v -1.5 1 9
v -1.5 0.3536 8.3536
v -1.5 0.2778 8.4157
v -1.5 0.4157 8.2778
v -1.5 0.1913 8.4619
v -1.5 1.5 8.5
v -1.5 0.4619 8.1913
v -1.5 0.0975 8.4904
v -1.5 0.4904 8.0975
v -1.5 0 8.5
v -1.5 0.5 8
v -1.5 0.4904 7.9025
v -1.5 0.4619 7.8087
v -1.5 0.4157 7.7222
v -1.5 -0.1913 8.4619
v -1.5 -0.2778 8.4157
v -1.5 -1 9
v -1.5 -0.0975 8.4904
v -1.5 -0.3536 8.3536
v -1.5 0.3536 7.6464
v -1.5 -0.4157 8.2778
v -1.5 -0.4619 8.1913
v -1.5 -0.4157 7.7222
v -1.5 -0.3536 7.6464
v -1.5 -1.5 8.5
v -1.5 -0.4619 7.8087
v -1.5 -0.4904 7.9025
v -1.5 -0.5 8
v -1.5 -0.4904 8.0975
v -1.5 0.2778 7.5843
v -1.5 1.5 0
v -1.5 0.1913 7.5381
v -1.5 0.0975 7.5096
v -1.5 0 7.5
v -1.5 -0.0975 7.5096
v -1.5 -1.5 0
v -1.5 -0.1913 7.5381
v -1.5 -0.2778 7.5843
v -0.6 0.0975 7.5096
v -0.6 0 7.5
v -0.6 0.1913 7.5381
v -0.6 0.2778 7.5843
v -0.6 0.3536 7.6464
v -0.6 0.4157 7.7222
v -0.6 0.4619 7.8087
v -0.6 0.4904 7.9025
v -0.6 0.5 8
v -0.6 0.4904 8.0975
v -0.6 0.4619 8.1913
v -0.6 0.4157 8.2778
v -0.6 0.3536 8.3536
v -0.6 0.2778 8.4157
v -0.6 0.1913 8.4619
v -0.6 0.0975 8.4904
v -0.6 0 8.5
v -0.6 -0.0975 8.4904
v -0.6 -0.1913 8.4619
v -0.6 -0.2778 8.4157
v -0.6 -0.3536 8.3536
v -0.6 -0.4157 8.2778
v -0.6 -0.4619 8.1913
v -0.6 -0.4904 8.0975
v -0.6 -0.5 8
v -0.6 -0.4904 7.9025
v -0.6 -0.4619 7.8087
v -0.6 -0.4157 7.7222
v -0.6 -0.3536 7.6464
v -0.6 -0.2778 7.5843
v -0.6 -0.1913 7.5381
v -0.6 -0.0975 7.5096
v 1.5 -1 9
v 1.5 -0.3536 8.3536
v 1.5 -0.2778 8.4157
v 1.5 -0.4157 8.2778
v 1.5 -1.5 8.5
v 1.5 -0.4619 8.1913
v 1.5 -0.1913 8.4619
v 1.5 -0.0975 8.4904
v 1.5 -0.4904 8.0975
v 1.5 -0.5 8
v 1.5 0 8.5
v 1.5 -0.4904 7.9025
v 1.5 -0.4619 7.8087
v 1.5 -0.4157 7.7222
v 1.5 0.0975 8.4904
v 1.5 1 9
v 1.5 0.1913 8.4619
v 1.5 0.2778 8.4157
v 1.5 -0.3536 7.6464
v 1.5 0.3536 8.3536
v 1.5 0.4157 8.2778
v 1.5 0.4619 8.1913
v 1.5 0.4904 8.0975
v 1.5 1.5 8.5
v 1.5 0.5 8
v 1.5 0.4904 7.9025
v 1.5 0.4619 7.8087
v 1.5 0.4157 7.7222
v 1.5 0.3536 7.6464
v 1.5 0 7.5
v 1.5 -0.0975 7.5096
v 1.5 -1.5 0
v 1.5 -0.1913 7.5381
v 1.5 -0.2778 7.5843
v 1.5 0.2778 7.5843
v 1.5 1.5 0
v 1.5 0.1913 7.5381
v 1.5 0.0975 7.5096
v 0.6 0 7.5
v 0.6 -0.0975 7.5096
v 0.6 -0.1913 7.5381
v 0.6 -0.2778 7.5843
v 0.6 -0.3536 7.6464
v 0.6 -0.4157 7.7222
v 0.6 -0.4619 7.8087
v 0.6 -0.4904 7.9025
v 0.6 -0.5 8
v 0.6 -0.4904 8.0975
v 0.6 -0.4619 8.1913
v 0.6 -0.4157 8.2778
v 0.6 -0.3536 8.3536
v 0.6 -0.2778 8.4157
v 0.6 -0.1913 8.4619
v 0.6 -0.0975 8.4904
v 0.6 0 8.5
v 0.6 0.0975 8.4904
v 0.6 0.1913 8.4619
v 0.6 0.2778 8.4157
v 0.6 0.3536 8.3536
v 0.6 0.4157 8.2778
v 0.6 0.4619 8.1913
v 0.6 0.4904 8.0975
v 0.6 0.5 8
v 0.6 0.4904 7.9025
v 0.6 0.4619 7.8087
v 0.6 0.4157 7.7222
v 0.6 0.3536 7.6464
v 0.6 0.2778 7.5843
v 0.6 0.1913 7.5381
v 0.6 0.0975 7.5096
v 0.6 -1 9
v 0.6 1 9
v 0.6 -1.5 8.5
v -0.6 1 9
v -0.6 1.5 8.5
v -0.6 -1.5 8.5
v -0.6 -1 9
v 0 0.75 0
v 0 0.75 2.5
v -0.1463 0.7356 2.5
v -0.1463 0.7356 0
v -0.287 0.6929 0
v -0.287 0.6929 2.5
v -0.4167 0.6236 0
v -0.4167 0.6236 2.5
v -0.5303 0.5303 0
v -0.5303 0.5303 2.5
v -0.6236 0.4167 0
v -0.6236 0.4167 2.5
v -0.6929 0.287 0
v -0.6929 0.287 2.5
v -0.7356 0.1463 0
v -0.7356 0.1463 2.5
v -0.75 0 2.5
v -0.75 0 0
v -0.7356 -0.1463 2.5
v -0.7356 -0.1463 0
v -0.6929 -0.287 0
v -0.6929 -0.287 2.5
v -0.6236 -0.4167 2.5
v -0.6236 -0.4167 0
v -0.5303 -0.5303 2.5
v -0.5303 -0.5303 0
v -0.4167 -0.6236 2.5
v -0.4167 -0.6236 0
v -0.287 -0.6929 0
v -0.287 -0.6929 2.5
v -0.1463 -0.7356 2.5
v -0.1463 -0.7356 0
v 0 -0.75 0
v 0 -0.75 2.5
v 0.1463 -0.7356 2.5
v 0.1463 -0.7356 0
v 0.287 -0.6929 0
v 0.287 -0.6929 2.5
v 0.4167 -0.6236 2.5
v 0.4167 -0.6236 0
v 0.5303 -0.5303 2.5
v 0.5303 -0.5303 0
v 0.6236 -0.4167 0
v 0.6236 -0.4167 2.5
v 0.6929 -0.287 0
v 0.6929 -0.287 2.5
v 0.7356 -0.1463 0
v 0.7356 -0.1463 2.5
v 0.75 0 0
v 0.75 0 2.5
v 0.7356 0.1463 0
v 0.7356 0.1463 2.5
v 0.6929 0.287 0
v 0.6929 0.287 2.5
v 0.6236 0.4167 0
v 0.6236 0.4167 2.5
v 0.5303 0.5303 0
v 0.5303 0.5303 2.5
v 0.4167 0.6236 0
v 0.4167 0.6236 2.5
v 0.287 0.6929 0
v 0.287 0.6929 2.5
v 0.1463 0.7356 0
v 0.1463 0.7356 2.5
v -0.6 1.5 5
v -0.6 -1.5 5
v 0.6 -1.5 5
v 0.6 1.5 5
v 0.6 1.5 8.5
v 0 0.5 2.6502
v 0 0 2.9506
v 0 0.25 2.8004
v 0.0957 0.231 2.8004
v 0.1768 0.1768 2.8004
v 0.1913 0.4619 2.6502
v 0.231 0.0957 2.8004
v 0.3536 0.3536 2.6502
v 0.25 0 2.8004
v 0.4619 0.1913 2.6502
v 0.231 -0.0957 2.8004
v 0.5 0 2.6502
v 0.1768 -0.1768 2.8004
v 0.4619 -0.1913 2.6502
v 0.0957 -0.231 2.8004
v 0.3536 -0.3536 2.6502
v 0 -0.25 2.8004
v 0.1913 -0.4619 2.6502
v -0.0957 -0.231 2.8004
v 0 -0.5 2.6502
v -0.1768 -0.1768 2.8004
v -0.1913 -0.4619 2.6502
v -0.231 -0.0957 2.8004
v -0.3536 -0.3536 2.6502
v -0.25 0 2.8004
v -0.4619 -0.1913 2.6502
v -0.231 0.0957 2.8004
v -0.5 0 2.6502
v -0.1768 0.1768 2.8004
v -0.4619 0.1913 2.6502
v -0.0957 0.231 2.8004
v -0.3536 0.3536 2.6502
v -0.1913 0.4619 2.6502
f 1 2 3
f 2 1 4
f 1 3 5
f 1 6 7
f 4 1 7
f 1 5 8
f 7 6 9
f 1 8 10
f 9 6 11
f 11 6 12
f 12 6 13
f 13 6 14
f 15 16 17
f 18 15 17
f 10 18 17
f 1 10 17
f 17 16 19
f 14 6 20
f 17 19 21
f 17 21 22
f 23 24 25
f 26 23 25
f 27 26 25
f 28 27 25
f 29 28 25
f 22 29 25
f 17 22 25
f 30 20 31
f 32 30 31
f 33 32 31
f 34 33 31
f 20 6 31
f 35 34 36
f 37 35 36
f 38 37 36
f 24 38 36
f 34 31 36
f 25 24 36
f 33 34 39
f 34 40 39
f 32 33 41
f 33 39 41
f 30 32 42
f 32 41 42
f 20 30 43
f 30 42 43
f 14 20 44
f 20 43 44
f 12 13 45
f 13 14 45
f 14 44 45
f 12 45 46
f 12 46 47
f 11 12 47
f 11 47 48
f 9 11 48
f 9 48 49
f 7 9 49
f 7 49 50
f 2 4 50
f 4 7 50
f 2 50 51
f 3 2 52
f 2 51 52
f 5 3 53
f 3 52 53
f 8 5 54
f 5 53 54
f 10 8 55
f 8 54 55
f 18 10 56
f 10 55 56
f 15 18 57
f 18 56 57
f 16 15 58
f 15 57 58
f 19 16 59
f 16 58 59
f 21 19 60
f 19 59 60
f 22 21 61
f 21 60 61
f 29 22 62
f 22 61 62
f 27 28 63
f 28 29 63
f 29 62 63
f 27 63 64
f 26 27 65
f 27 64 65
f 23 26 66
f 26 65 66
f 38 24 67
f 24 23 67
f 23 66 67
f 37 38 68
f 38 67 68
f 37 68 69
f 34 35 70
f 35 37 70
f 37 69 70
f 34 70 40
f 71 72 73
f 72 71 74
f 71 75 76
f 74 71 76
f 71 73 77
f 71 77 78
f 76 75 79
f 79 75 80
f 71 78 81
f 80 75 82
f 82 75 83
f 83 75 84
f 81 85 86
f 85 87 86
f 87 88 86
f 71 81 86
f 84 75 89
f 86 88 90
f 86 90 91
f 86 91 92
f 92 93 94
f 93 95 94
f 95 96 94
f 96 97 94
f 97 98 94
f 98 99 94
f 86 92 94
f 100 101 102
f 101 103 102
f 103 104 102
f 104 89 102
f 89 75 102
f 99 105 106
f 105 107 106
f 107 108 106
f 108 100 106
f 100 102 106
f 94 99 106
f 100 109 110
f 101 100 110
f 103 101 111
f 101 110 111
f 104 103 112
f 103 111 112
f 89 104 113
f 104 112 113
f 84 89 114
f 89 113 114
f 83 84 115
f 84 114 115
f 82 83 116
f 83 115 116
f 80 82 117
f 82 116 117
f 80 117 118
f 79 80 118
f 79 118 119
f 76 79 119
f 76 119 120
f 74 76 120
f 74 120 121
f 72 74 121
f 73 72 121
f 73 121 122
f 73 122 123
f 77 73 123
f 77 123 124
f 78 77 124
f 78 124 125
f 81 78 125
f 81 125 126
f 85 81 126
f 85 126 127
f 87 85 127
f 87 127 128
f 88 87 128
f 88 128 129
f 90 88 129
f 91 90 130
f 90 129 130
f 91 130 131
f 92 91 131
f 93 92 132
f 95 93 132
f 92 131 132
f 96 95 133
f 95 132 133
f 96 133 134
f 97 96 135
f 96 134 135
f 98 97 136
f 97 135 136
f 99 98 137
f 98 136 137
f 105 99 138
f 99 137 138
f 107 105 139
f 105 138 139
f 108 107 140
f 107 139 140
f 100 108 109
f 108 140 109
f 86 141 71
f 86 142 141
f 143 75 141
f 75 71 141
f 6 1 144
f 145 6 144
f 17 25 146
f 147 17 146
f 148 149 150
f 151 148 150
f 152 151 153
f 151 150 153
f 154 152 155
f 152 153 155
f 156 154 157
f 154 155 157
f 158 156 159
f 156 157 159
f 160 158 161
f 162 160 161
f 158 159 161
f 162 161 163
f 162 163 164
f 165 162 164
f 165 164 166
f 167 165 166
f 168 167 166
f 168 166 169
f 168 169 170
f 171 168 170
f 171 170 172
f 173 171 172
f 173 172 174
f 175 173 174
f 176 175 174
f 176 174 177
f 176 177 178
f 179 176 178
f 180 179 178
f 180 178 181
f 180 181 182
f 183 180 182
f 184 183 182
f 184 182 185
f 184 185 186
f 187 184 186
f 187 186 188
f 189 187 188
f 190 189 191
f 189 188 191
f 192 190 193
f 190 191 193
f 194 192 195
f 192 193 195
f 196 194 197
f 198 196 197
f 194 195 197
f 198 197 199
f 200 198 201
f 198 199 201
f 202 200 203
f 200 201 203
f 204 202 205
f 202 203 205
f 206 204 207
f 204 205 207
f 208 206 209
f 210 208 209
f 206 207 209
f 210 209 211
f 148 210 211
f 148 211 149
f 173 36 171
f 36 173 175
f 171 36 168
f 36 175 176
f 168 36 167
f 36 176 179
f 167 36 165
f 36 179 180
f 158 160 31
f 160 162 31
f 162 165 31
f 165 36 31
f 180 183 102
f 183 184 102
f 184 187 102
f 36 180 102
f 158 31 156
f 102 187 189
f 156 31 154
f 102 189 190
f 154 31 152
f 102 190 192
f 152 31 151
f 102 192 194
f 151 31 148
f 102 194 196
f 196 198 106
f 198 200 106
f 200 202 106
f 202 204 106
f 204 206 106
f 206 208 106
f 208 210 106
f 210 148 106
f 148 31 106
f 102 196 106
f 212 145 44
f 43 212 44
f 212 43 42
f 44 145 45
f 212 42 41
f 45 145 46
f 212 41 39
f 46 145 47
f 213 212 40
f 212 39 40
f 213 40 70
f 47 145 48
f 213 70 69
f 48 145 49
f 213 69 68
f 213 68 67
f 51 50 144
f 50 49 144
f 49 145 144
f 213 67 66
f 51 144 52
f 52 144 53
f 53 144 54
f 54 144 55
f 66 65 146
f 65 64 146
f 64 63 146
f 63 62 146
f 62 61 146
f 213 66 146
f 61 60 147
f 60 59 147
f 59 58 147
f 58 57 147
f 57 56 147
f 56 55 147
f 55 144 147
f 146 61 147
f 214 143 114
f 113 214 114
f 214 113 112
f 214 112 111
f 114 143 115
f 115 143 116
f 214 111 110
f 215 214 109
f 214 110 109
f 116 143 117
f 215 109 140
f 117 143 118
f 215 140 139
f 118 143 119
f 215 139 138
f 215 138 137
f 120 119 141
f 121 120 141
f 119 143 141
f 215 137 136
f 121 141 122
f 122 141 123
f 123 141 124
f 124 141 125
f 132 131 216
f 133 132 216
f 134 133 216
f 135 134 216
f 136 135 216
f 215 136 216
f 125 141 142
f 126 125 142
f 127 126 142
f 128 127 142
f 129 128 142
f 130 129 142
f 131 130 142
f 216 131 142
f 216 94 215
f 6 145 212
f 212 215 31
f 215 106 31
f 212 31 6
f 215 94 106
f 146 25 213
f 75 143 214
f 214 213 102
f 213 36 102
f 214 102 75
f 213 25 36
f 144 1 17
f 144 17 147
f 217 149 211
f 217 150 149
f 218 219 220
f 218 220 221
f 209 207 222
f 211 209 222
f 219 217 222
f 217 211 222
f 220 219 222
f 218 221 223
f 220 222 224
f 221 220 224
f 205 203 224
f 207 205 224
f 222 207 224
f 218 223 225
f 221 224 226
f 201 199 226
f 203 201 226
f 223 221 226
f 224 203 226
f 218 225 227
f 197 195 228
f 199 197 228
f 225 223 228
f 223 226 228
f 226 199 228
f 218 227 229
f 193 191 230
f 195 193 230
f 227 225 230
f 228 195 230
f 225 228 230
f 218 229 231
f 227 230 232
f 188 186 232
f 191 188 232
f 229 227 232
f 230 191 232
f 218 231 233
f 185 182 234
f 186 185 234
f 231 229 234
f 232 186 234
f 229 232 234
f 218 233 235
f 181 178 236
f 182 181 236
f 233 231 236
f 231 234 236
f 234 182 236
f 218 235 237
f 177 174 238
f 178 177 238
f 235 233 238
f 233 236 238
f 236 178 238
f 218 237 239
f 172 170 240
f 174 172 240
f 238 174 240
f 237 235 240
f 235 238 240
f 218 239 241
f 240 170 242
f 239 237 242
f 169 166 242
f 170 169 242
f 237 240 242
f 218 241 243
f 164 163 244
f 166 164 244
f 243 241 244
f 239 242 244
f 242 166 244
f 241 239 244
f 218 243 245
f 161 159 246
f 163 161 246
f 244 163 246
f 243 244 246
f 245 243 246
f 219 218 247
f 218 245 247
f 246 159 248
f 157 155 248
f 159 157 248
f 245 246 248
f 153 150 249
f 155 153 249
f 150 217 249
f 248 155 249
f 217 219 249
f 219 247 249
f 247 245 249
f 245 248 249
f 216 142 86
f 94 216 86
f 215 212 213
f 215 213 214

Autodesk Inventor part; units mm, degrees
ref_plane "YZ Plane" through (0, 0, 0) normal (1, 0, 0) x (0, 1, 0)
ref_plane "XZ Plane" through (0, 0, 0) normal (0, 1, 0) x (-1, 0, 0)
ref_plane "XY Plane" through (0, 0, 0) normal (0, 0, 1) x (1, 0, 0)
sketch "Skizze1" plane through (0, 0, 0) normal (0, 0, 1) x (1, 0, 0)
  line L0 (-1.5, -1.5) -> (1.5, -1.5)
  line L1 (1.5, -1.5) -> (1.5, 1.5)
  line L2 (1.5, 1.5) -> (-1.5, 1.5)
  line L3 (-1.5, 1.5) -> (-1.5, -1.5)
  line L4 (-1.5, -1.5) -> (1.5, 1.5) construction
  line L5 (1.5, -1.5) -> (-1.5, 1.5) construction
  point P0 (0, 0)
  dimension "d0" = 3
  dimension "d1" = 3
extrude "Extrusion1" add sketch "Skizze1" along normal blind 9
sketch "Skizze2" plane through (0, 0, 9) normal (0, 0, 1) x (1, 0, 0)
  line L0 (0, 0) -> (0, 3.7062) construction
  line L1 (1.5, 1.5) -> (-1.5, 1.5) projected
  line L2 (-0.6, -1.5) -> (0.6, -1.5)
  line L3 (0.6, -1.5) -> (0.6, 1.5)
  line L4 (0.6, 1.5) -> (-0.6, 1.5)
  line L5 (-0.6, 1.5) -> (-0.6, -1.5)
  line L6 (-1.5, -1.5) -> (1.5, -1.5) projected
  dimension "d4" = 1.2
extrude "Extrusion2" cut sketch "Skizze2" against normal blind 4
sketch "Skizze3" plane through (1.5, -1.5, 0) normal (1, 0, 0) x (0, 0, -1)
  line L0 (-9, 0) -> (-9, 3) projected
  line L1 (0, 0) -> (0, 3) projected
  point P0 (0, 1.5)
  point P1 (-8, 1.5)
  point P2 (-9, 1.5)
  dimension "d14" = 8
hole "Bohrung1" at (1.5, 0, 8) direction (-1, 0, 0) diameter 1 depth 0.9
mirror "Spiegeln1" about plane through (0, 0, 0) normal (1, 0, 0) of "Bohrung1"
sketch "Skizze4" plane through (0, 0, 0) normal (0, 0, -1) x (-1, 0, 0)
  line L0 (-1.5, -1.5) -> (-1.5, 1.5) projected
  line L1 (1.5, -1.5) -> (-1.5, -1.5) projected
  point P0 (0, 0)
  point P1 (0, 0)
  point P2 (-1.5, 0)
  point P3 (0, -1.5)
hole "Bohrung2" at (0, 0, 0) direction (0, 0, 1) diameter 1.5 depth 2.5 tip angle 118
chamfer "Fasen1" distance 0.5 angle 45 4 edges at (1.05, -1.5, 9) (1.05, 1.5, 9) (-1.05, 1.5, 9) (-1.05, -1.5, 9)
properties part number "kopf"
